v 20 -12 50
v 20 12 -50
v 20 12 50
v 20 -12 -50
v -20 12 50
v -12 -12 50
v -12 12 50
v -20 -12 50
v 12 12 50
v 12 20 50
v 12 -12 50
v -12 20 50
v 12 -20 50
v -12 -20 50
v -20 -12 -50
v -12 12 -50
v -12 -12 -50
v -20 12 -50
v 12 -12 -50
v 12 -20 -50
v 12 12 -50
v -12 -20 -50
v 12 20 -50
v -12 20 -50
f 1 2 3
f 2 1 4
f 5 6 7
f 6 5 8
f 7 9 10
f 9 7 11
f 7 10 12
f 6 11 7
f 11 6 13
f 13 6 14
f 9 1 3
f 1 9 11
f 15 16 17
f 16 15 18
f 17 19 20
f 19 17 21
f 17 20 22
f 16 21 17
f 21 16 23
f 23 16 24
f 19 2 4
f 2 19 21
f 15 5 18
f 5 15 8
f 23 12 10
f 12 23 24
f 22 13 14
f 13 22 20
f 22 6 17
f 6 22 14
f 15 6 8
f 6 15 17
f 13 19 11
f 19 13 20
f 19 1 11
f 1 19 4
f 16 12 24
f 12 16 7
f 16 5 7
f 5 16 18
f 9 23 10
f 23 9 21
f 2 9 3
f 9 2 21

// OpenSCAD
module aluminium_extrusion() {
    difference() {
        cube([40, 40, 100], center = true);
        translate([-18, -18, -50])
            cube([4, 4, 100]);
        translate([14, -18, -50])
            cube([4, 4, 100]);
        translate([-18, 14, -50])
            cube([4, 4, 100]);
        translate([14, 14, -50])
            cube([4, 4, 100]);
        translate([-20, -20, -50])
            cube([8, 8, 100]);
        translate([12, -20, -50])
            cube([8, 8, 100]);
        translate([-20, 12, -50])
            cube([8, 8, 100]);
        translate([12, 12, -50])
            cube([8, 8, 100]);
    }
}

aluminium_extrusion();
